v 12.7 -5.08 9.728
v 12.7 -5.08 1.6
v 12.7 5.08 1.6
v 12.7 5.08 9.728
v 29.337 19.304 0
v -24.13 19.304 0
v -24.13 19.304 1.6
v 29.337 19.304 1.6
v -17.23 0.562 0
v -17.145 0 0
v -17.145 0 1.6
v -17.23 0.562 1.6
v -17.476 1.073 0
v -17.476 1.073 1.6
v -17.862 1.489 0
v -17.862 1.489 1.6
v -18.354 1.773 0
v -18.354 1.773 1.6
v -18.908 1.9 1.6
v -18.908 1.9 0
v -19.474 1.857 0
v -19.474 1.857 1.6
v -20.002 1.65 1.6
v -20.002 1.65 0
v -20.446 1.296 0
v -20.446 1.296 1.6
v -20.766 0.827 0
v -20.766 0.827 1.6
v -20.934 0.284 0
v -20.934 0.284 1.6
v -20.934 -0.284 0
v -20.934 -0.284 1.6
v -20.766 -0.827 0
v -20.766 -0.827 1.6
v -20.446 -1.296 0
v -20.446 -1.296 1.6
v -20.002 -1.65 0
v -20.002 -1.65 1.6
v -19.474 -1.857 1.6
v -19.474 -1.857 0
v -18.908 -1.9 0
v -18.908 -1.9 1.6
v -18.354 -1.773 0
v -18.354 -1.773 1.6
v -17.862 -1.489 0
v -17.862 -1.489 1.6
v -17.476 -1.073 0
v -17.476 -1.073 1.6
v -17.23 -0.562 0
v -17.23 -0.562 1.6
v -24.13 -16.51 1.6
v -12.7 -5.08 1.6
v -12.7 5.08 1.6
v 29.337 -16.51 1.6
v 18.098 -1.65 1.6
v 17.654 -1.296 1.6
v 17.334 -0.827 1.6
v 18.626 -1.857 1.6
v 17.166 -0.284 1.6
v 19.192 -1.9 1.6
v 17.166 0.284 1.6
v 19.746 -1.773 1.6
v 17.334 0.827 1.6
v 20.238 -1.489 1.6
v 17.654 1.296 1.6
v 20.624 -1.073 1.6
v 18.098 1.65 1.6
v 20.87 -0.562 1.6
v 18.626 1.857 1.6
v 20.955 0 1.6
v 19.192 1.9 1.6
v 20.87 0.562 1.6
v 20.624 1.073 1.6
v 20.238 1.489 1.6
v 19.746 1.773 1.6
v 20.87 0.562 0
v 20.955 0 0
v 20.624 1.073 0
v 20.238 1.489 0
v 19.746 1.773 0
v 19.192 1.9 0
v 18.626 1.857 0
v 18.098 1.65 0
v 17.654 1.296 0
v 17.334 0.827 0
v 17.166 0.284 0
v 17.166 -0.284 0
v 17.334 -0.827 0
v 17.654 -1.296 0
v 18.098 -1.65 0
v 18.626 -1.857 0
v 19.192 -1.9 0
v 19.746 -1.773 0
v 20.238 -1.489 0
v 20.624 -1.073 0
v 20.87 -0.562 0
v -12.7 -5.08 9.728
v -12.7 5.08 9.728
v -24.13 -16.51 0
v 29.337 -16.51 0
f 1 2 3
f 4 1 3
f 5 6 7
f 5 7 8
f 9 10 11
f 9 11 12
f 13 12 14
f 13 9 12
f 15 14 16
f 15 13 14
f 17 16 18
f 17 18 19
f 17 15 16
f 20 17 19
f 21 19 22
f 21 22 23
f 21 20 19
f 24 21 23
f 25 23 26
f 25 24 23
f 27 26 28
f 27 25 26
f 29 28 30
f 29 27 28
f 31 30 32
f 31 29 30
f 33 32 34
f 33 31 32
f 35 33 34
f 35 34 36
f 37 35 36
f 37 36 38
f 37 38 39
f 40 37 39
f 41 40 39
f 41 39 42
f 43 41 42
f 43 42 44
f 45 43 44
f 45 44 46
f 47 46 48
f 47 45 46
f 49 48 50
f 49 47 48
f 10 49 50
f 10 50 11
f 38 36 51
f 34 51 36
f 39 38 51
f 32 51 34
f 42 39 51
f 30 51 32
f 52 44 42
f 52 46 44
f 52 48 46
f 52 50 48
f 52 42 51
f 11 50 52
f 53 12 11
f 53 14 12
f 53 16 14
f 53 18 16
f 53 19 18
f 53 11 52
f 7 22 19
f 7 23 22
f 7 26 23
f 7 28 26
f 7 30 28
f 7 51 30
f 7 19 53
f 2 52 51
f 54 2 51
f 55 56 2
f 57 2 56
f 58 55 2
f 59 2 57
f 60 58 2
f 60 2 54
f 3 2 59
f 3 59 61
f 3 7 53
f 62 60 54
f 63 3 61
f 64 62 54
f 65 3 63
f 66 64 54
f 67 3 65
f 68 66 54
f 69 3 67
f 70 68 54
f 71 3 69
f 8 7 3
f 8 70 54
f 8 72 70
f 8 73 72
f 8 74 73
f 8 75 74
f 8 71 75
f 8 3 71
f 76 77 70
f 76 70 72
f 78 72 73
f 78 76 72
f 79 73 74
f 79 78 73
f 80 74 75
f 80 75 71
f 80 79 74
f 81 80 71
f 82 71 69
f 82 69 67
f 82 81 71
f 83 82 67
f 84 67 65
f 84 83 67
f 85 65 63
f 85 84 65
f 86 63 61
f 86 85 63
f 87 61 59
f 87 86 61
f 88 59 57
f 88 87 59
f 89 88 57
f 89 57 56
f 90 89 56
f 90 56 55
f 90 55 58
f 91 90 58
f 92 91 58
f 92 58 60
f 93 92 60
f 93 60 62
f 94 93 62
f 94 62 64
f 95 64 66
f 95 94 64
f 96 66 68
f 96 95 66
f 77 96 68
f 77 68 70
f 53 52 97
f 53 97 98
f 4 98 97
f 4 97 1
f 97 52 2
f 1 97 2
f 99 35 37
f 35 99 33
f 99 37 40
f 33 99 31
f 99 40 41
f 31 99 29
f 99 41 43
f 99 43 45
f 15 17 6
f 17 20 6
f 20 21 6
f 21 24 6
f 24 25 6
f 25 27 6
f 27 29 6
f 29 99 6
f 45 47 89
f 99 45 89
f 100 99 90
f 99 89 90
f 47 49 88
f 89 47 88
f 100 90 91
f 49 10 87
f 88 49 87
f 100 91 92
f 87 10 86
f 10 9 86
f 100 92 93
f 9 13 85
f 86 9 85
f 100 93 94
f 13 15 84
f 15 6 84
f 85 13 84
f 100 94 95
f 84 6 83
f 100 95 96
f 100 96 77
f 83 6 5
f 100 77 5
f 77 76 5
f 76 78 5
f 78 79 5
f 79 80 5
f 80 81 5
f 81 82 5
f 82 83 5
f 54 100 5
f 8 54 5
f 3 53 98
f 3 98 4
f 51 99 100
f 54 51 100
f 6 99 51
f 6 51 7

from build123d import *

# Parameters (mm, degrees)
F0_W     = 53.467
F0_H     = 35.814
F0_R     = 1.905
F1_DEPTH = 1.6002
F2_W     = 25.4
F2_H     = 10.16
F3_DEPTH = 8.128


with BuildPart() as f1:
    # F0 (on Top) → F1 (new body)
    with BuildSketch(Plane.XY):
        with Locations((2.6035, 1.397)):
            Rectangle(F0_W, F0_H)
        with Locations((-19.05, 0)):
            Circle(F0_R, mode=Mode.SUBTRACT)
        with Locations((19.05, 0)):
            Circle(F0_R, mode=Mode.SUBTRACT)
    extrude(amount=F1_DEPTH)

    # F2 (on face) → F3 (join)
    with BuildSketch(Plane.XY.offset(1.6002)):
        Rectangle(F2_W, F2_H)
    extrude(amount=F3_DEPTH)


solid = f1.part
